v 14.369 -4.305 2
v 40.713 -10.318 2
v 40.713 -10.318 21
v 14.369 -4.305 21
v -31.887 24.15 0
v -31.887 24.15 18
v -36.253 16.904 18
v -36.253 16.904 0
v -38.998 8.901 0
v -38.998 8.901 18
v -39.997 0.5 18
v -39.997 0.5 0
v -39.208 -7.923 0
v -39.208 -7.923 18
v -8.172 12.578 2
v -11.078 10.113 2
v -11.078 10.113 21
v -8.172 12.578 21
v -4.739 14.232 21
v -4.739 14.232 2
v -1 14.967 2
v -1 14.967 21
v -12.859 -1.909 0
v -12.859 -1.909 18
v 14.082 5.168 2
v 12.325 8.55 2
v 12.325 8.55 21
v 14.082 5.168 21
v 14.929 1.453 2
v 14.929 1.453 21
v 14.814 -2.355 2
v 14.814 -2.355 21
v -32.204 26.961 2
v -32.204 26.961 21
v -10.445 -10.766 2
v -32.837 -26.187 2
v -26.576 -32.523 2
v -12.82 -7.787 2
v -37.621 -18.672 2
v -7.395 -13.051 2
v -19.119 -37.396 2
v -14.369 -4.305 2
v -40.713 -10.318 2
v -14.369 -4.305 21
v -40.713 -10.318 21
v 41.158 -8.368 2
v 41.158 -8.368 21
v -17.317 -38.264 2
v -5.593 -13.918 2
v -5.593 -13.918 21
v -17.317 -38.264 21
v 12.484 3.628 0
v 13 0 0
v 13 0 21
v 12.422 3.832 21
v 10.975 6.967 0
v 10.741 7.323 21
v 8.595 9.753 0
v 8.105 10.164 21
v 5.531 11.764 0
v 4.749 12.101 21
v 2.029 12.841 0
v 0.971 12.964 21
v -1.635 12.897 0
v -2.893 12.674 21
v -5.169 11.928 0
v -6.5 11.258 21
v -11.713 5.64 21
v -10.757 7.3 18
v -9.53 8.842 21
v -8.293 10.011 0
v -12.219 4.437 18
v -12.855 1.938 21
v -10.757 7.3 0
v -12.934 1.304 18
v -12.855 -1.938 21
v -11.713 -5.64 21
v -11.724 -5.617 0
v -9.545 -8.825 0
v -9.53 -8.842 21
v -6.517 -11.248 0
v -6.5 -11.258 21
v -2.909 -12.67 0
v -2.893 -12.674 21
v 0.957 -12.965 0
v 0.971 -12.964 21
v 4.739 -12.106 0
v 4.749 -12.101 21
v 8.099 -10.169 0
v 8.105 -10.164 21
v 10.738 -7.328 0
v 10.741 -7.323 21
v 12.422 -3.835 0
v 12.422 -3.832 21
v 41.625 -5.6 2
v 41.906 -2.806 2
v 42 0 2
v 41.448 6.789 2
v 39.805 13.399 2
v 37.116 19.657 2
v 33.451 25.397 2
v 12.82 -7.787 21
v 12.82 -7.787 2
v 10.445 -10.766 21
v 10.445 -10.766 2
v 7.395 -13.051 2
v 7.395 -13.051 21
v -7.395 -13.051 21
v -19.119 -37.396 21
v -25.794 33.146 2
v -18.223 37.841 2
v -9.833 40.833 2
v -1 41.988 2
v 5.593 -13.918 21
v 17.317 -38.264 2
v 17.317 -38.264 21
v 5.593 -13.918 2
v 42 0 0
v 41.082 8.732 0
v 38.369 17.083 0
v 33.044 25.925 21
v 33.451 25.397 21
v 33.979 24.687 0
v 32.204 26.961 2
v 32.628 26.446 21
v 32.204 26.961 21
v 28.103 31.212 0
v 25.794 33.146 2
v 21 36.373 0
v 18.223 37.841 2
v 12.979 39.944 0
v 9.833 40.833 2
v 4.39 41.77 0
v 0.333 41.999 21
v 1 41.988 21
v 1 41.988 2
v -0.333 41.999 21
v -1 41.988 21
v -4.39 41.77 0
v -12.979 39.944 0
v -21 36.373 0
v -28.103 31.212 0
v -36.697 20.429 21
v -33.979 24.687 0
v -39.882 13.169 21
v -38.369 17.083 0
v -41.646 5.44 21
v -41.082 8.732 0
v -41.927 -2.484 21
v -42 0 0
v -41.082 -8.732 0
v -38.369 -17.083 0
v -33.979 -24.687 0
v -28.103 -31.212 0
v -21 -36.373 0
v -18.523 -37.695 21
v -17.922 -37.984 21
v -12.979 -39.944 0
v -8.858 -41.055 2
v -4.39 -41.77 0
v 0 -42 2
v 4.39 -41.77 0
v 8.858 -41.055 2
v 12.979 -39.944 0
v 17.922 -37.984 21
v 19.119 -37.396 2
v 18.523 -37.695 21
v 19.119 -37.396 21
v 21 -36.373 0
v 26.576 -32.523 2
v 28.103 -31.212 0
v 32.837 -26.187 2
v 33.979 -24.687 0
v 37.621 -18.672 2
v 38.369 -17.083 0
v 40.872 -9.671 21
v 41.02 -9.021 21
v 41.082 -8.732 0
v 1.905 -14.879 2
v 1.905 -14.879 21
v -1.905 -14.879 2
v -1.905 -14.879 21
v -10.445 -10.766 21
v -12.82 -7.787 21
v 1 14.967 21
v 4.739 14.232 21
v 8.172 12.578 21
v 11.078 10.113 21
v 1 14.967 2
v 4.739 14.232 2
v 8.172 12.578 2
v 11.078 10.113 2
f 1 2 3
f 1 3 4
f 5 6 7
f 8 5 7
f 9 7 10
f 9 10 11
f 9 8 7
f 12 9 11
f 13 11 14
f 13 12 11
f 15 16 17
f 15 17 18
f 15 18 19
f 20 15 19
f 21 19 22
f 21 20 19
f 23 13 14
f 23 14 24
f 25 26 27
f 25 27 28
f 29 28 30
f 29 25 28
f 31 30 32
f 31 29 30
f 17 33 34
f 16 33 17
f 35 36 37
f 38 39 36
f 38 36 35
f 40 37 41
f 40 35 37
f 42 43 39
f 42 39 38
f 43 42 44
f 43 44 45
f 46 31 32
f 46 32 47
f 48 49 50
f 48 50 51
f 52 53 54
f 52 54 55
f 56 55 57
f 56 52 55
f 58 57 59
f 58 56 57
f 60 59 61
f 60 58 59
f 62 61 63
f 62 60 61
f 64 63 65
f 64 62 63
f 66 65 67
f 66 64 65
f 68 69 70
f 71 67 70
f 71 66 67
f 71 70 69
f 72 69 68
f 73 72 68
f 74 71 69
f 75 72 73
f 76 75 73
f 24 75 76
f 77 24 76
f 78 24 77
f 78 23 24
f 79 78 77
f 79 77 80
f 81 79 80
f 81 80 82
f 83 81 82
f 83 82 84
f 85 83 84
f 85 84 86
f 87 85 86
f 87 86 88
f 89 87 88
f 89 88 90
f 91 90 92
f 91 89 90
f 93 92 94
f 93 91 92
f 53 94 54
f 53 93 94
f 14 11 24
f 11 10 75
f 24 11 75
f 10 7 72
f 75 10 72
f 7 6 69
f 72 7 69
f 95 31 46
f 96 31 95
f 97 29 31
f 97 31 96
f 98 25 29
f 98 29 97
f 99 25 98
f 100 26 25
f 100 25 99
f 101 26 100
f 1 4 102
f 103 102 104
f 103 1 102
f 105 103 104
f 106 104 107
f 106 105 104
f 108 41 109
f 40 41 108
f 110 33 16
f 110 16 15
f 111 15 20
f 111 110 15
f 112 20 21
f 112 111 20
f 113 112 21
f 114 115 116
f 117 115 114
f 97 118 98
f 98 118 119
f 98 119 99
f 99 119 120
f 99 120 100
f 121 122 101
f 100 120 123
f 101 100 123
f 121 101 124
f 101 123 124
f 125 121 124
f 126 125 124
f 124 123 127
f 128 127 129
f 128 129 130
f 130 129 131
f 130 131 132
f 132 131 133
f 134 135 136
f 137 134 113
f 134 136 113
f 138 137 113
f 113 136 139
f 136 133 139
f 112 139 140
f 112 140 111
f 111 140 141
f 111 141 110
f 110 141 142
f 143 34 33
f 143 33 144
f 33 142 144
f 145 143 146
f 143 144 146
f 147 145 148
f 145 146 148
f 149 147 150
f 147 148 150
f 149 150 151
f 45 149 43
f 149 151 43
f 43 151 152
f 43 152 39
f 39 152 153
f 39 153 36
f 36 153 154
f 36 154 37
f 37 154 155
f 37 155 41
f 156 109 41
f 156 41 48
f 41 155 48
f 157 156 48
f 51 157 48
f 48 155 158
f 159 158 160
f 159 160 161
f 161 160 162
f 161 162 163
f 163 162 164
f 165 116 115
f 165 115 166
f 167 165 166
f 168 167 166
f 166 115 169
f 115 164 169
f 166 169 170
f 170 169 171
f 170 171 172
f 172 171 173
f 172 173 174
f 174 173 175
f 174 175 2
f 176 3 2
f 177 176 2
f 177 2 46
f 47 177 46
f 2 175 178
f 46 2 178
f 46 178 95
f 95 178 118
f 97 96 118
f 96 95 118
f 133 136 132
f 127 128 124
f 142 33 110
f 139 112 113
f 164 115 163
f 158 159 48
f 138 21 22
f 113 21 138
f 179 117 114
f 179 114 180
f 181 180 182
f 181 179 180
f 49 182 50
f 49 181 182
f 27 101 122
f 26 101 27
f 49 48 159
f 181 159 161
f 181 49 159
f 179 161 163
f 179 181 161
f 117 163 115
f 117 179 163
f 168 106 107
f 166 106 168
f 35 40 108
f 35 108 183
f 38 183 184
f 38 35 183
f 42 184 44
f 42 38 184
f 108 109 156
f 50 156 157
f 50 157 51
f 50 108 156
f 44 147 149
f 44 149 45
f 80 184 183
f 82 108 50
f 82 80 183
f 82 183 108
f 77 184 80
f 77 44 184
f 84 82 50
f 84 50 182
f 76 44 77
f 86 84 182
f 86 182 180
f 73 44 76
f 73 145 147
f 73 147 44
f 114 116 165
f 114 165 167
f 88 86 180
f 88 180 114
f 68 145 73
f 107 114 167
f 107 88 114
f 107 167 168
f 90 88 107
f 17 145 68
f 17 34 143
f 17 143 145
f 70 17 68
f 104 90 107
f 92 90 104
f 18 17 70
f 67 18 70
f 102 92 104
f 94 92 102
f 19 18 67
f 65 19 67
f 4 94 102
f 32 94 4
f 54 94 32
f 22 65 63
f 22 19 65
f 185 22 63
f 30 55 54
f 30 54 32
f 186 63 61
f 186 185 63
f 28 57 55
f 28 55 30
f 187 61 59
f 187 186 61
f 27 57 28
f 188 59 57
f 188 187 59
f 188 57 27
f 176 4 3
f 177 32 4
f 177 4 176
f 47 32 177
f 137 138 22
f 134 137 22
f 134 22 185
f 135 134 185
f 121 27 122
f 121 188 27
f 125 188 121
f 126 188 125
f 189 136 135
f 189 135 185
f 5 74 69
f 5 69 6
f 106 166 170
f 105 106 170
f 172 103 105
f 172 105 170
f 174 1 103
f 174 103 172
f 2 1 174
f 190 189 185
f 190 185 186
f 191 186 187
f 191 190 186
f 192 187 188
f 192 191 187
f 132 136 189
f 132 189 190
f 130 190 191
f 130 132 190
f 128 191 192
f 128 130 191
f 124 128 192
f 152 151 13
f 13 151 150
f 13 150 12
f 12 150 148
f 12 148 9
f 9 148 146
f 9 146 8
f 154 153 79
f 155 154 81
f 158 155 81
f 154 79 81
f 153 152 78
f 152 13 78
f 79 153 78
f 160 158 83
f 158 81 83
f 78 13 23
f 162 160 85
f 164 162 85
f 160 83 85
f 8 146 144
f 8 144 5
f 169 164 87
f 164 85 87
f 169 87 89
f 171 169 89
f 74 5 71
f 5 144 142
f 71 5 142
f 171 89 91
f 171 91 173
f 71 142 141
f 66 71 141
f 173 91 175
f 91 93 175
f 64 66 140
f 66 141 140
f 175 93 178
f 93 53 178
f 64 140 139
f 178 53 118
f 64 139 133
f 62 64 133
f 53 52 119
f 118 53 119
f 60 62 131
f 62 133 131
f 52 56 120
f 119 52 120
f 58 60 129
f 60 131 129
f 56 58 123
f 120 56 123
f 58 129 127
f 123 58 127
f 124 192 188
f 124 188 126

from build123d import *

# Parameters (mm, degrees)
F0_R     = 42
F0_R_2   = 13
F3_DEPTH = 21
F4_DEPTH = 25
F9_DEPTH = 18


# Not quite as in the source:
# - a feature names something its author has since deleted; it is built from what else it names


with BuildPart() as f3:
    # F0 (on Top) → F3 (new body)
    with BuildSketch(Plane.XY):
        Circle(F0_R)
        Circle(F0_R_2, mode=Mode.SUBTRACT)
    extrude(amount=F3_DEPTH)

    # F2 (on offset) → F4 (cut)
    with BuildSketch(Plane.XY.offset(2)):
        with BuildLine():
            Line((1, 43.9886348958), (1, 14.9666295471))
            ThreePointArc((1, 14.9666295471), (6.5082560868, 13.5145330185), (11.0778923645, 10.1133723733))
            Line((11.0778923645, 10.1133723733), (33.7682098305, 28.2082967377))
            ThreePointArc((33.7682098305, 28.2082967377), (19.0908845212, 39.6426301877), (1, 43.9886348958))
        make_face()
        with BuildLine():
            ThreePointArc((-11.0778923645, 10.1133723733), (-6.5082560868, 13.5145330185), (-1, 14.9666295471))
            Line((-1, 14.9666295471), (-1, 43.9886348958))
            ThreePointArc((-1, 43.9886348958), (-19.0908845212, 39.6426301877), (-33.7682098305, 28.2082967377))
            Line((-33.7682098305, 28.2082967377), (-11.0778923645, 10.1133723733))
        make_face()
        with BuildLine():
            ThreePointArc((-7.3947460578, -13.0505835402), (-11.727472237, -9.3523470279), (-14.3688639628, -4.3053162972))
            Line((-14.3688639628, -4.3053162972), (-42.6632270448, -10.7633200327))
            ThreePointArc((-42.6632270448, -10.7633200327), (-34.4005852286, -27.4335512818), (-19.9869222552, -39.1985068436))
            Line((-19.9869222552, -39.1985068436), (-7.3947460578, -13.0505835402))
        make_face()
        with BuildLine():
            ThreePointArc((5.592808322, -13.9183510185), (0, -15), (-5.592808322, -13.9183510185))
            Line((-5.592808322, -13.9183510185), (-18.1849845194, -40.0662743218))
            ThreePointArc((-18.1849845194, -40.0662743218), (0, -44), (18.1849845194, -40.0662743218))
            Line((18.1849845194, -40.0662743218), (5.592808322, -13.9183510185))
        make_face()
        with BuildLine():
            ThreePointArc((14.3688639628, -4.3053162972), (11.727472237, -9.3523470279), (7.3947460578, -13.0505835402))
            Line((7.3947460578, -13.0505835402), (19.9869222552, -39.1985068436))
            ThreePointArc((19.9869222552, -39.1985068436), (34.4005852286, -27.4335512818), (42.6632270448, -10.7633200327))
            Line((42.6632270448, -10.7633200327), (14.3688639628, -4.3053162972))
        make_face()
        with BuildLine():
            ThreePointArc((12.3248719682, 8.5497094083), (14.6239186827, 3.3378140093), (14.8139058307, -2.3554604728))
            Line((14.8139058307, -2.3554604728), (43.1082689127, -8.8134642083))
            ThreePointArc((43.1082689127, -8.8134642083), (42.896828136, 9.7909210941), (35.0151894342, 26.6446337728))
            Line((35.0151894342, 26.6446337728), (12.3248719682, 8.5497094083))
        make_face()
    extrude(amount=F4_DEPTH, mode=Mode.SUBTRACT)

    # F8 (on offset) → F9 (cut)
    with BuildSketch(Plane.XY):
        with BuildLine():
            Line((-39.2080294912, -7.9232600118), (-12.8590309309, -1.9092730337))
            ThreePointArc((-12.8590309309, -1.9092730337), (-12.6740628584, 2.8927721414), (-10.7571840173, 7.2995199854))
            Line((-10.7571840173, 7.2995199854), (-31.8874402635, 24.150337042))
            ThreePointArc((-31.8874402635, 24.150337042), (-38.9976968795, 8.900969829), (-39.2080294912, -7.9232600118))
        make_face()
    extrude(amount=F9_DEPTH, mode=Mode.SUBTRACT)


solid = f3.part
